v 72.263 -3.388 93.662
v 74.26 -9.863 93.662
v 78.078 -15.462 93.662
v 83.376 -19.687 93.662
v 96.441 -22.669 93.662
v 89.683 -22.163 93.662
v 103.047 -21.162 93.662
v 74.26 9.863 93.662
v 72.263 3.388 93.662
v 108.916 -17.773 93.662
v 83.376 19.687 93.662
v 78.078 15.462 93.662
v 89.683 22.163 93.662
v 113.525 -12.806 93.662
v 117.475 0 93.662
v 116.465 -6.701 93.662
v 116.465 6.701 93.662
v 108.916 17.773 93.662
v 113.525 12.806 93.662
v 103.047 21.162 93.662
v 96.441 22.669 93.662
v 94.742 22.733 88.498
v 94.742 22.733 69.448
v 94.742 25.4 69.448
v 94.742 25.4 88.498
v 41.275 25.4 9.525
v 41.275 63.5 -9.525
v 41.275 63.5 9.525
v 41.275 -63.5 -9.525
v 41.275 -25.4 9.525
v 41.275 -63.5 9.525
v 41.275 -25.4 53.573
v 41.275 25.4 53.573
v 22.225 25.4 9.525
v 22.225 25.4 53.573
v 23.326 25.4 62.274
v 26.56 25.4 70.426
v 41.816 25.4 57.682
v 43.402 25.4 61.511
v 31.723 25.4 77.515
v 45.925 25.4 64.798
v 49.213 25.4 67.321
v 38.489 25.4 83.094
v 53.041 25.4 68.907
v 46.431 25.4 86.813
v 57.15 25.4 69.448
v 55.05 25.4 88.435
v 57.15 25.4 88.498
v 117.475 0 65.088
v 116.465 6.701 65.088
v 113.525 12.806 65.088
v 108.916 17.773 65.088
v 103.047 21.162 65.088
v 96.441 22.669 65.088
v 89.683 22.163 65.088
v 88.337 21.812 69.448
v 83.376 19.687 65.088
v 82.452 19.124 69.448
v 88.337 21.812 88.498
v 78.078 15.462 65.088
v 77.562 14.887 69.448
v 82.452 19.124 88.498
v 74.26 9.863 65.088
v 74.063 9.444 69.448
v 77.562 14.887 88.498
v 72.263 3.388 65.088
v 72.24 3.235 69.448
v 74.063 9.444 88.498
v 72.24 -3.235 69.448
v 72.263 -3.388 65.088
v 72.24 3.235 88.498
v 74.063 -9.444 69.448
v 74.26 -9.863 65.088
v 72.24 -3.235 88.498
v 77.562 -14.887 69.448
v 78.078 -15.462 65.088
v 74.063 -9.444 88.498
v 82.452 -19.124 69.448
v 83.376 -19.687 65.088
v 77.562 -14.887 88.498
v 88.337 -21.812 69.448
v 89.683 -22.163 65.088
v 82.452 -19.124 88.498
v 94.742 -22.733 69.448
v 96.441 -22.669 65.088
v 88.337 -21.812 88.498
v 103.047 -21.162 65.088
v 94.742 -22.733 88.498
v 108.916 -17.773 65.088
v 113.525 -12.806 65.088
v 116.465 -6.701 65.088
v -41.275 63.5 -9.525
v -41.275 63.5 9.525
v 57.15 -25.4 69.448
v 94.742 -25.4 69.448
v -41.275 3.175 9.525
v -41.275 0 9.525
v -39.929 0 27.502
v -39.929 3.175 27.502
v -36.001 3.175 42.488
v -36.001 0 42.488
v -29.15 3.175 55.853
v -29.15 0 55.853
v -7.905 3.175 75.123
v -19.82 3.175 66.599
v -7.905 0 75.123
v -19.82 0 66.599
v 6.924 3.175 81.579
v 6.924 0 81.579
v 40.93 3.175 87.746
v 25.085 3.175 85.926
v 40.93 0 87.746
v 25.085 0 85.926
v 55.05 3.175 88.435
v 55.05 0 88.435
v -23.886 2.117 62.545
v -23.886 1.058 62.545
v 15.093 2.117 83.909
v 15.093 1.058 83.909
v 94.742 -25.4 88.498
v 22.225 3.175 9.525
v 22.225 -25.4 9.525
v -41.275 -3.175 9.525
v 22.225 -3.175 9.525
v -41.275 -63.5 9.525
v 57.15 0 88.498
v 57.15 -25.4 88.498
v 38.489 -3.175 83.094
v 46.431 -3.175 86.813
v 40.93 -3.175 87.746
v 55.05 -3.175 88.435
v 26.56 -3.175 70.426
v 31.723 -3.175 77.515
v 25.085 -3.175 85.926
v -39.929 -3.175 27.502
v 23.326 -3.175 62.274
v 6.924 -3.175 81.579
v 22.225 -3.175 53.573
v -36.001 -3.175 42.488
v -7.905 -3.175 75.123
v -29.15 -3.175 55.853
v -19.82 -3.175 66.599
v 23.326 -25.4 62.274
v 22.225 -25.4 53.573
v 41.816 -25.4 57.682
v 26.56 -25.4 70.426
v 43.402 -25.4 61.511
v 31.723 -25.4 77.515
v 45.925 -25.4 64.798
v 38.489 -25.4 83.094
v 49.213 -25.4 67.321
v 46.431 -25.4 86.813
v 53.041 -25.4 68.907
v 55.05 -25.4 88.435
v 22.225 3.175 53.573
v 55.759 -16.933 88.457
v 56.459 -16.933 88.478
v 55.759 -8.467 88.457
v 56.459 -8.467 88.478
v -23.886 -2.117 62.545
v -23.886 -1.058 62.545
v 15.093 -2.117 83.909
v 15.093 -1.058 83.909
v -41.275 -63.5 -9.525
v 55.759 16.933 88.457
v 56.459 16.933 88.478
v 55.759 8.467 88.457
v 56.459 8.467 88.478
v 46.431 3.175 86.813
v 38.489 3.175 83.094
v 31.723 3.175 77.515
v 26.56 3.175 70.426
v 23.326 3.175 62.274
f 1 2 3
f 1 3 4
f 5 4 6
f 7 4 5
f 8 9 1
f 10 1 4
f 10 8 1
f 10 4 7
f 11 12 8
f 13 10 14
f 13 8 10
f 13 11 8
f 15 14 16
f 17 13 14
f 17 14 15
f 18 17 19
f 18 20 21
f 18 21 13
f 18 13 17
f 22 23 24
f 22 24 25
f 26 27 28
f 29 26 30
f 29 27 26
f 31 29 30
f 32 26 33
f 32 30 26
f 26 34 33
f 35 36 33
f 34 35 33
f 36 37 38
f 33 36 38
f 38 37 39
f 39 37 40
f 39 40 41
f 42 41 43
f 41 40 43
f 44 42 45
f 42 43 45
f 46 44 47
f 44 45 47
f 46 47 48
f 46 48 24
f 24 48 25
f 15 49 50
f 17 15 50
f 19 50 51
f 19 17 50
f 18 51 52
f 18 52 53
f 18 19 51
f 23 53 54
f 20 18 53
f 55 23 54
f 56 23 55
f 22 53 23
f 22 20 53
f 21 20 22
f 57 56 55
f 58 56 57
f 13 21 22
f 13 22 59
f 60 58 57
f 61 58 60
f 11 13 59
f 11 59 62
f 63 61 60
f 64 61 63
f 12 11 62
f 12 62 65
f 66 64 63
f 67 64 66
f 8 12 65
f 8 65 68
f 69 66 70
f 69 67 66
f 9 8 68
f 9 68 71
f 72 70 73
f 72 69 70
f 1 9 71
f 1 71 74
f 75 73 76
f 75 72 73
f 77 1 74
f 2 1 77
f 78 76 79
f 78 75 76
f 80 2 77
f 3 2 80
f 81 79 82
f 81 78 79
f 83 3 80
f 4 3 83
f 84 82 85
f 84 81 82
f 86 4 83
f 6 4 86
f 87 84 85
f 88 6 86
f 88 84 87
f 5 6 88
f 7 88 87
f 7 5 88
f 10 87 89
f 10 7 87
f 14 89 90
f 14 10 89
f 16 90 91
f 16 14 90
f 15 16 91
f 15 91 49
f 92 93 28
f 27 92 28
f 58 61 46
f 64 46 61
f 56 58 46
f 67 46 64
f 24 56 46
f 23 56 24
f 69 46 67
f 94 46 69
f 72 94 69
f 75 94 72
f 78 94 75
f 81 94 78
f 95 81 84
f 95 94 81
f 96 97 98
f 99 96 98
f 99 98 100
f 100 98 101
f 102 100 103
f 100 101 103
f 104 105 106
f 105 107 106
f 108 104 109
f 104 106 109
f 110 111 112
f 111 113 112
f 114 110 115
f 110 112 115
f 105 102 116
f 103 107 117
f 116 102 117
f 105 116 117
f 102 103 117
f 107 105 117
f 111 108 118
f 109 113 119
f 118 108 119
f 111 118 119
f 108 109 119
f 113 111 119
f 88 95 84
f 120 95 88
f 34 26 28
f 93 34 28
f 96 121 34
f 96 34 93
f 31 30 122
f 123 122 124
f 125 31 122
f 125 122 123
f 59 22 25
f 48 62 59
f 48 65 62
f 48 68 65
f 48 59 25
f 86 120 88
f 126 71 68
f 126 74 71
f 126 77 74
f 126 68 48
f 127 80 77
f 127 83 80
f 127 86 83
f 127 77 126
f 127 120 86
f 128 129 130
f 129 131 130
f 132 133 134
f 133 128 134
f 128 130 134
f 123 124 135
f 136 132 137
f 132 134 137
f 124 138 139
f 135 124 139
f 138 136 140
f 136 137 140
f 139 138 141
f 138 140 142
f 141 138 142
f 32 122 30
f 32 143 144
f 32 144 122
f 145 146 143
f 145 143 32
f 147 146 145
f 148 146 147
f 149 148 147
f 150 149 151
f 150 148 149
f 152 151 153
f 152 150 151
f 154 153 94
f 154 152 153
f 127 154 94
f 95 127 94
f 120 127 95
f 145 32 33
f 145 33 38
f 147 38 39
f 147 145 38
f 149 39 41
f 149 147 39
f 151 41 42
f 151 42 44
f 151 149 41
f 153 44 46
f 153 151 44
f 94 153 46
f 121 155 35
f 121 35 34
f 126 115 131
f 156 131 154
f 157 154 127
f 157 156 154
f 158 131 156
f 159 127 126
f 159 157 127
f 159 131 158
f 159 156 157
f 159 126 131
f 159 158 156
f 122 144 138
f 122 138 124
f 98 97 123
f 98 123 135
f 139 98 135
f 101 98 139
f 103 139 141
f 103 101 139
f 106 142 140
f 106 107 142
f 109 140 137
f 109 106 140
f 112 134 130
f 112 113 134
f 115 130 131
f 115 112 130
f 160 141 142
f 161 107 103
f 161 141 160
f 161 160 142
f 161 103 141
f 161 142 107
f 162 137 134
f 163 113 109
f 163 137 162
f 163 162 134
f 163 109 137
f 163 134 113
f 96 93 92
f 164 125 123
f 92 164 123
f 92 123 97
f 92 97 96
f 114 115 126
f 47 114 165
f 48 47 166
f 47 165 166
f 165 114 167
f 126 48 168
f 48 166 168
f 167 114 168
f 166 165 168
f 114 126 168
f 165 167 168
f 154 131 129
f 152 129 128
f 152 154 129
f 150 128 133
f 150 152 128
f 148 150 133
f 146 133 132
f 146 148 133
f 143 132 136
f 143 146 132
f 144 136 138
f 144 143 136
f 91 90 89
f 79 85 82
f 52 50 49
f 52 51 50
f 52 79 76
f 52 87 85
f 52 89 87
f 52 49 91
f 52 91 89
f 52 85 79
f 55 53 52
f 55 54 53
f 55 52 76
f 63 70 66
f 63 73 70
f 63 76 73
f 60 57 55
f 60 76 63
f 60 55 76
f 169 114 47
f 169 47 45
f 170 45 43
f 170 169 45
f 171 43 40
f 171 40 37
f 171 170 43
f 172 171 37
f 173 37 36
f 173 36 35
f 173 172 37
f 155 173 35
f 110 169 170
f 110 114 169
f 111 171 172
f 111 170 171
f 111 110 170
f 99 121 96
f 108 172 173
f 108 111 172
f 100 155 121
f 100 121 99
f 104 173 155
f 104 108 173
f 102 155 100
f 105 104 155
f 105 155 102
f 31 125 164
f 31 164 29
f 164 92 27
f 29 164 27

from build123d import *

# Parameters (mm, degrees)
F1_DEPTH = 63.5
F0_W     = 28.067
F0_H     = 19.05
F2_DEPTH = 25.4
F3_DEPTH = 3.175


with BuildPart() as f1:
    # F0 (on Front) → F1 (new body, symmetric)
    with BuildSketch(Plane.XZ):
        Polygon((-41.275, 9.525), (-41.275, -9.525), (41.275, -9.525), (41.275, 9.525), (22.225, 9.525), align=None)
    extrude(amount=F1_DEPTH, both=True)

    # F0 (on Front) → F2 (join, symmetric)
    with BuildSketch(Plane.XZ):
        with BuildLine():
            Line((22.225, 9.525), (41.275, 9.525))
            Line((41.275, 9.525), (41.275, 53.5730462312))
            ThreePointArc((41.275, 53.5730462312), (45.9246798487, 64.7983663825), (57.15, 69.4480462312))
            Line((57.15, 69.4480462312), (66.675, 69.4480462312))
            Line((66.675, 69.4480462312), (66.675, 88.4980462312))
            Line((66.675, 88.4980462312), (57.15, 88.4980462312))
            add(Edge.make_bspline(
                [(55.0500442631, 88.4348564381), (55.7636307959, 88.4570758509), (56.4639128881, 88.477925733), (57.15, 88.4980462312)],
                knots=[123.5650142277, 123.5650142277, 123.5650142277, 123.5650142277, 126.1912146547, 126.1912146547, 126.1912146547, 126.1912146547], degree=3))
            ThreePointArc((55.0500442631, 88.4348564381), (31.7226861514, 77.5147950279), (22.225, 53.5730462312))
            Line((22.225, 53.5730462312), (22.225, 9.525))
        make_face()
        with Locations((80.7085, 78.9730462312)):
            Rectangle(F0_W, F0_H)
    extrude(amount=F2_DEPTH, both=True)

    # F0 (on Front) → F3 (join, symmetric)
    with BuildSketch(Plane.XZ):
        with BuildLine():
            add(Edge.make_bspline(
                [(-41.275, 9.525), (-41.5528520698, 83.3121254449), (21.4751772531, 87.3894137404), (55.0500442631, 88.4348564381)],
                knots=[0, 0, 0, 0, 123.5650142277, 123.5650142277, 123.5650142277, 123.5650142277], degree=3))
            Line((-41.275, 9.525), (22.225, 9.525))
            Line((22.225, 9.525), (22.225, 53.5730462312))
            ThreePointArc((22.225, 53.5730462312), (31.7226861514, 77.5147950279), (55.0500442631, 88.4348564381))
        make_face()
    extrude(amount=F3_DEPTH, both=True)

    # F0 (on Front) → F4 (revolve)
    with BuildSketch(Plane.XZ):
        Polygon((94.742, 93.6625), (94.742, 88.4980462312), (94.742, 69.4480462312), (94.742, 65.0875), (117.475, 65.0875), (117.475, 93.6625), align=None)
    revolve(axis=Axis((94.742, 0, 79.375), (0, 0, 1)))


solid = f1.part
